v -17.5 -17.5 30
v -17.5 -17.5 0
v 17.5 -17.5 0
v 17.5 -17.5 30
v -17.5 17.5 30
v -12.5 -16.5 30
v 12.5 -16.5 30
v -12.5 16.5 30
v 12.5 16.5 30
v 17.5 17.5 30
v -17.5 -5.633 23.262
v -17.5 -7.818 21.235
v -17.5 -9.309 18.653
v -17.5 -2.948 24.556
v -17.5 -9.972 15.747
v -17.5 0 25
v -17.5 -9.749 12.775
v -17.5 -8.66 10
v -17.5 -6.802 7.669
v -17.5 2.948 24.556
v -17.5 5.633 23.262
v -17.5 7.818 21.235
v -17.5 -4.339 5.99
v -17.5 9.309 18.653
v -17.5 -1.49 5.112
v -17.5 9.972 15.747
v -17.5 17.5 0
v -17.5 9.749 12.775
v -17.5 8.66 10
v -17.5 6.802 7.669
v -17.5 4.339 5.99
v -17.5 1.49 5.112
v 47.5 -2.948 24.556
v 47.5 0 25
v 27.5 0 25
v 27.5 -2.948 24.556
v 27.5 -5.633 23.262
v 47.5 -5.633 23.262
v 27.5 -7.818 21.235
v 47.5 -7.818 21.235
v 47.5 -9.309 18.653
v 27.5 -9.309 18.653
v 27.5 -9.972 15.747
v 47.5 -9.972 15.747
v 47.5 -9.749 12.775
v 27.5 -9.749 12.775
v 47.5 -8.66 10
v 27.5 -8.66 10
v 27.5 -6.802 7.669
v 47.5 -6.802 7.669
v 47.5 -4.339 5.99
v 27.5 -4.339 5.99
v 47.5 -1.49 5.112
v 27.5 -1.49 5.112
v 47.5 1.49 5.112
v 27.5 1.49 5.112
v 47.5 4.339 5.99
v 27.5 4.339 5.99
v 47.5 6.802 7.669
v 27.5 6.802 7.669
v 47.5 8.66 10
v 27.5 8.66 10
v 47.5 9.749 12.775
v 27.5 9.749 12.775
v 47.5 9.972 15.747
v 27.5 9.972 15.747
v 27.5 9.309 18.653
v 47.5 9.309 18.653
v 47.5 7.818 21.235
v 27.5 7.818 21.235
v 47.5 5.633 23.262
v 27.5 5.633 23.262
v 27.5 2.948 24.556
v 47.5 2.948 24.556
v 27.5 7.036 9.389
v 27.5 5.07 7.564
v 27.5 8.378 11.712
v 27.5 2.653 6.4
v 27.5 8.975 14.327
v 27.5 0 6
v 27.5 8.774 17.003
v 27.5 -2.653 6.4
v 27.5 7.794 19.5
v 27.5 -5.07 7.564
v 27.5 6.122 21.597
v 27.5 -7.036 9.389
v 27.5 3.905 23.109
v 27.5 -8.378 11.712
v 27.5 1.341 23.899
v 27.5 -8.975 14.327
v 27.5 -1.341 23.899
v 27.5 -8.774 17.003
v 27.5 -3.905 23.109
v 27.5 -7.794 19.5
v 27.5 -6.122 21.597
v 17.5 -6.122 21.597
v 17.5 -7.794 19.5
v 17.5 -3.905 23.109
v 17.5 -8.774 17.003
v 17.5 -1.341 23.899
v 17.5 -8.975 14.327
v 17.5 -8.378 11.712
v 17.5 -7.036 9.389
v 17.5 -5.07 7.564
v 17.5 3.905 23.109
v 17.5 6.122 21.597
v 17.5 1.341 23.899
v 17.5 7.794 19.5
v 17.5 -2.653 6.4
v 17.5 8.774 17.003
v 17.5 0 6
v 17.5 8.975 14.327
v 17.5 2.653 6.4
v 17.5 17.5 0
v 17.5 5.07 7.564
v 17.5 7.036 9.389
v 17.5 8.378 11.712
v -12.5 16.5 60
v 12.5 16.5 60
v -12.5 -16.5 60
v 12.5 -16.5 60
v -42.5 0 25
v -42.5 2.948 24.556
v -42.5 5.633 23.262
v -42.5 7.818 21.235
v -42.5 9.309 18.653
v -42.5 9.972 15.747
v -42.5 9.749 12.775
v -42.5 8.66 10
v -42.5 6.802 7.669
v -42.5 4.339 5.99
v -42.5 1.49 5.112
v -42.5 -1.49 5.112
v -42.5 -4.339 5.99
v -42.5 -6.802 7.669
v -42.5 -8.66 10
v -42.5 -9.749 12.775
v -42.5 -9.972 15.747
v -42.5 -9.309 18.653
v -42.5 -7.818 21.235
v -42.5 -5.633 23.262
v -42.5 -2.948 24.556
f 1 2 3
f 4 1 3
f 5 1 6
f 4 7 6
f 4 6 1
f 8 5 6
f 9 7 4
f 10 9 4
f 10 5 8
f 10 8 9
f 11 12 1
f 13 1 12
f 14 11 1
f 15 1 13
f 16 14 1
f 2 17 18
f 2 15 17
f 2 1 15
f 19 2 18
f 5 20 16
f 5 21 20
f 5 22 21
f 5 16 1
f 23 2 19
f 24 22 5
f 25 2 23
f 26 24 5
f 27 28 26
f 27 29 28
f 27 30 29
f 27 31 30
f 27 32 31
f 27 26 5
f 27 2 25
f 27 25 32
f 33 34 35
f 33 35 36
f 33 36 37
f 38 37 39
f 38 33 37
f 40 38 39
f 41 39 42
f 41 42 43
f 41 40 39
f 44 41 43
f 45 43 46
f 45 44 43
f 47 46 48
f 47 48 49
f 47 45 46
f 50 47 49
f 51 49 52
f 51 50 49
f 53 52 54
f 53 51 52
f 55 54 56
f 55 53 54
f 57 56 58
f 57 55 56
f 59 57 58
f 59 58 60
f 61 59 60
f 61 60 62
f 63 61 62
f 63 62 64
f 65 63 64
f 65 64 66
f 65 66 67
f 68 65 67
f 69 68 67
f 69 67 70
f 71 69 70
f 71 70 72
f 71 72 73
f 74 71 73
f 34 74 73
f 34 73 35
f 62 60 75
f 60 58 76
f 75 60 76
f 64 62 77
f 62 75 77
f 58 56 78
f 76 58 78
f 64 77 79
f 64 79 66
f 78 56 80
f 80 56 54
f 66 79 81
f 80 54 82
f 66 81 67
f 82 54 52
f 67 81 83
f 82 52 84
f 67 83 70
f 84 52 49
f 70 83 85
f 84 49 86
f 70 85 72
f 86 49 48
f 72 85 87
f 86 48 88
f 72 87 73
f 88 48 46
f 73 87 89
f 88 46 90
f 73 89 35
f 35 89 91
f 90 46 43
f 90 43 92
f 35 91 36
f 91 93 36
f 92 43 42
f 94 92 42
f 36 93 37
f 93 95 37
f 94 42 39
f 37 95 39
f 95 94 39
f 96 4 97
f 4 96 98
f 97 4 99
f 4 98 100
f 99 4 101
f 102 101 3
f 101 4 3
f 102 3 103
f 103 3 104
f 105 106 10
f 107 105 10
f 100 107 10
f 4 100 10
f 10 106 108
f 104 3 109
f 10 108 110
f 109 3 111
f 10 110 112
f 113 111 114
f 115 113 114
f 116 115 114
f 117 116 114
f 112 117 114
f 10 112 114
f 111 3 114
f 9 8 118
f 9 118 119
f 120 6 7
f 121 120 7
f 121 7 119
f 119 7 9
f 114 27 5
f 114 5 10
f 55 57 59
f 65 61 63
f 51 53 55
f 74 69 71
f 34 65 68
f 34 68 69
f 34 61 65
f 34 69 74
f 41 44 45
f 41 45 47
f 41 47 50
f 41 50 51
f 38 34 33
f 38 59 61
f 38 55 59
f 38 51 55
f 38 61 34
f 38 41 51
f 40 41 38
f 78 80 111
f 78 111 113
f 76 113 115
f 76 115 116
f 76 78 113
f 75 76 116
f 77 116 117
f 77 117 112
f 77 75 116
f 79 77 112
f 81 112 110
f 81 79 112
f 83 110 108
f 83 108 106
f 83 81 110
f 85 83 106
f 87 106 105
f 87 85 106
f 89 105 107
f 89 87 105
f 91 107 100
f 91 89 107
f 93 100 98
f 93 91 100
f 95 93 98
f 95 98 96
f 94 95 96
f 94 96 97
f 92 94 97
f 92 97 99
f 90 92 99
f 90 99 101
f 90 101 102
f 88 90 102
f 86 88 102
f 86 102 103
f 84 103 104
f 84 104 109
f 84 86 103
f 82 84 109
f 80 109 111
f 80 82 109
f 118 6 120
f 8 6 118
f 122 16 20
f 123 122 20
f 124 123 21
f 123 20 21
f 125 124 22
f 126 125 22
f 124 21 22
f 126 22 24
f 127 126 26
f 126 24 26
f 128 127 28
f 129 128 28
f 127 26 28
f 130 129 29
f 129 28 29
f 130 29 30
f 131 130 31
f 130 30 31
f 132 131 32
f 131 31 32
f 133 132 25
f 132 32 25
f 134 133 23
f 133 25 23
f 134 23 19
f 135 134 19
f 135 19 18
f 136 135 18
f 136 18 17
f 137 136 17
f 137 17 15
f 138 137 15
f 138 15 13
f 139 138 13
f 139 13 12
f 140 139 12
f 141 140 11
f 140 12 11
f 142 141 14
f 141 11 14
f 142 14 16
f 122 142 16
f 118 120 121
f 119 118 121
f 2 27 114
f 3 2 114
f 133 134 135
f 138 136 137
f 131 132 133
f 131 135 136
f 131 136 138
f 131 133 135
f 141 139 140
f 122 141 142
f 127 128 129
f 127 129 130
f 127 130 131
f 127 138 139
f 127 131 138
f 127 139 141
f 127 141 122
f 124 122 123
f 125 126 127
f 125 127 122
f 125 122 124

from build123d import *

# Parameters (mm, degrees)
SKETCH1_W           = 35
SKETCH1_H           = 35
BOSS_EXTRUDE1_DEPTH = 30
SKETCH2_W           = 25
SKETCH2_H           = 35
BOSS_EXTRUDE2_DEPTH = 30
SKETCH3_R           = 10
BOSS_EXTRUDE3_DEPTH = 25
BOSS_EXTRUDE4_START = 30
SKETCH4_R           = 10
BOSS_EXTRUDE4_DEPTH = 30
CUT_EXTRUDE1_START  = 10
SKETCH5_R           = 10
SKETCH5_R_2         = 9
CUT_EXTRUDE1_DEPTH  = 10
SKETCH6_W           = 25
SKETCH6_H           = 1
CUT_EXTRUDE2_DEPTH  = 30


with BuildPart() as part:
    # Sketch1 → Boss-Extrude1 (new body)
    with BuildSketch(Plane.XY):
        Rectangle(SKETCH1_W, SKETCH1_H)
    extrude(amount=BOSS_EXTRUDE1_DEPTH)

    # Sketch2 → Boss-Extrude2 (add)
    with BuildSketch(Plane.XY.offset(30)):
        Rectangle(SKETCH2_W, SKETCH2_H)
    extrude(amount=BOSS_EXTRUDE2_DEPTH)

    # Sketch3 → Boss-Extrude3 (add)
    with BuildSketch(Plane.ZY.offset(17.5)):
        with Locations((15, 0)):
            Circle(SKETCH3_R)
    extrude(amount=BOSS_EXTRUDE3_DEPTH)

    # Sketch4 → Boss-Extrude4 (add)
    with BuildSketch(Plane(origin=(17.5, 0, 0), x_dir=(0, 0, -1), z_dir=(1, 0, 0)).offset(BOSS_EXTRUDE4_START)):
        with Locations(Location((-15, 0, 0), (0, 0, 180))):
            Circle(SKETCH4_R)
    extrude(amount=-BOSS_EXTRUDE4_DEPTH)

    # Sketch5 → Cut-Extrude1 (cut)
    with BuildSketch(Plane(origin=(17.5, 0, 0), x_dir=(0, 0, -1), z_dir=(1, 0, 0)).offset(CUT_EXTRUDE1_START)):
        with Locations(Location((-15, 0, 0), (0, 0, 180))):
            Circle(SKETCH5_R)
        with Locations((-15, 0)):
            Circle(SKETCH5_R_2, mode=Mode.SUBTRACT)
    extrude(amount=-CUT_EXTRUDE1_DEPTH, mode=Mode.SUBTRACT)

    # Sketch6 → Cut-Extrude2 (cut)
    with BuildSketch(Plane.XY.offset(60)):
        with Locations((0, 17)):
            Rectangle(SKETCH6_W, SKETCH6_H)
        with Locations((0, -17)):
            Rectangle(SKETCH6_W, SKETCH6_H)
    extrude(amount=-CUT_EXTRUDE2_DEPTH, mode=Mode.SUBTRACT)


solid = part.part
